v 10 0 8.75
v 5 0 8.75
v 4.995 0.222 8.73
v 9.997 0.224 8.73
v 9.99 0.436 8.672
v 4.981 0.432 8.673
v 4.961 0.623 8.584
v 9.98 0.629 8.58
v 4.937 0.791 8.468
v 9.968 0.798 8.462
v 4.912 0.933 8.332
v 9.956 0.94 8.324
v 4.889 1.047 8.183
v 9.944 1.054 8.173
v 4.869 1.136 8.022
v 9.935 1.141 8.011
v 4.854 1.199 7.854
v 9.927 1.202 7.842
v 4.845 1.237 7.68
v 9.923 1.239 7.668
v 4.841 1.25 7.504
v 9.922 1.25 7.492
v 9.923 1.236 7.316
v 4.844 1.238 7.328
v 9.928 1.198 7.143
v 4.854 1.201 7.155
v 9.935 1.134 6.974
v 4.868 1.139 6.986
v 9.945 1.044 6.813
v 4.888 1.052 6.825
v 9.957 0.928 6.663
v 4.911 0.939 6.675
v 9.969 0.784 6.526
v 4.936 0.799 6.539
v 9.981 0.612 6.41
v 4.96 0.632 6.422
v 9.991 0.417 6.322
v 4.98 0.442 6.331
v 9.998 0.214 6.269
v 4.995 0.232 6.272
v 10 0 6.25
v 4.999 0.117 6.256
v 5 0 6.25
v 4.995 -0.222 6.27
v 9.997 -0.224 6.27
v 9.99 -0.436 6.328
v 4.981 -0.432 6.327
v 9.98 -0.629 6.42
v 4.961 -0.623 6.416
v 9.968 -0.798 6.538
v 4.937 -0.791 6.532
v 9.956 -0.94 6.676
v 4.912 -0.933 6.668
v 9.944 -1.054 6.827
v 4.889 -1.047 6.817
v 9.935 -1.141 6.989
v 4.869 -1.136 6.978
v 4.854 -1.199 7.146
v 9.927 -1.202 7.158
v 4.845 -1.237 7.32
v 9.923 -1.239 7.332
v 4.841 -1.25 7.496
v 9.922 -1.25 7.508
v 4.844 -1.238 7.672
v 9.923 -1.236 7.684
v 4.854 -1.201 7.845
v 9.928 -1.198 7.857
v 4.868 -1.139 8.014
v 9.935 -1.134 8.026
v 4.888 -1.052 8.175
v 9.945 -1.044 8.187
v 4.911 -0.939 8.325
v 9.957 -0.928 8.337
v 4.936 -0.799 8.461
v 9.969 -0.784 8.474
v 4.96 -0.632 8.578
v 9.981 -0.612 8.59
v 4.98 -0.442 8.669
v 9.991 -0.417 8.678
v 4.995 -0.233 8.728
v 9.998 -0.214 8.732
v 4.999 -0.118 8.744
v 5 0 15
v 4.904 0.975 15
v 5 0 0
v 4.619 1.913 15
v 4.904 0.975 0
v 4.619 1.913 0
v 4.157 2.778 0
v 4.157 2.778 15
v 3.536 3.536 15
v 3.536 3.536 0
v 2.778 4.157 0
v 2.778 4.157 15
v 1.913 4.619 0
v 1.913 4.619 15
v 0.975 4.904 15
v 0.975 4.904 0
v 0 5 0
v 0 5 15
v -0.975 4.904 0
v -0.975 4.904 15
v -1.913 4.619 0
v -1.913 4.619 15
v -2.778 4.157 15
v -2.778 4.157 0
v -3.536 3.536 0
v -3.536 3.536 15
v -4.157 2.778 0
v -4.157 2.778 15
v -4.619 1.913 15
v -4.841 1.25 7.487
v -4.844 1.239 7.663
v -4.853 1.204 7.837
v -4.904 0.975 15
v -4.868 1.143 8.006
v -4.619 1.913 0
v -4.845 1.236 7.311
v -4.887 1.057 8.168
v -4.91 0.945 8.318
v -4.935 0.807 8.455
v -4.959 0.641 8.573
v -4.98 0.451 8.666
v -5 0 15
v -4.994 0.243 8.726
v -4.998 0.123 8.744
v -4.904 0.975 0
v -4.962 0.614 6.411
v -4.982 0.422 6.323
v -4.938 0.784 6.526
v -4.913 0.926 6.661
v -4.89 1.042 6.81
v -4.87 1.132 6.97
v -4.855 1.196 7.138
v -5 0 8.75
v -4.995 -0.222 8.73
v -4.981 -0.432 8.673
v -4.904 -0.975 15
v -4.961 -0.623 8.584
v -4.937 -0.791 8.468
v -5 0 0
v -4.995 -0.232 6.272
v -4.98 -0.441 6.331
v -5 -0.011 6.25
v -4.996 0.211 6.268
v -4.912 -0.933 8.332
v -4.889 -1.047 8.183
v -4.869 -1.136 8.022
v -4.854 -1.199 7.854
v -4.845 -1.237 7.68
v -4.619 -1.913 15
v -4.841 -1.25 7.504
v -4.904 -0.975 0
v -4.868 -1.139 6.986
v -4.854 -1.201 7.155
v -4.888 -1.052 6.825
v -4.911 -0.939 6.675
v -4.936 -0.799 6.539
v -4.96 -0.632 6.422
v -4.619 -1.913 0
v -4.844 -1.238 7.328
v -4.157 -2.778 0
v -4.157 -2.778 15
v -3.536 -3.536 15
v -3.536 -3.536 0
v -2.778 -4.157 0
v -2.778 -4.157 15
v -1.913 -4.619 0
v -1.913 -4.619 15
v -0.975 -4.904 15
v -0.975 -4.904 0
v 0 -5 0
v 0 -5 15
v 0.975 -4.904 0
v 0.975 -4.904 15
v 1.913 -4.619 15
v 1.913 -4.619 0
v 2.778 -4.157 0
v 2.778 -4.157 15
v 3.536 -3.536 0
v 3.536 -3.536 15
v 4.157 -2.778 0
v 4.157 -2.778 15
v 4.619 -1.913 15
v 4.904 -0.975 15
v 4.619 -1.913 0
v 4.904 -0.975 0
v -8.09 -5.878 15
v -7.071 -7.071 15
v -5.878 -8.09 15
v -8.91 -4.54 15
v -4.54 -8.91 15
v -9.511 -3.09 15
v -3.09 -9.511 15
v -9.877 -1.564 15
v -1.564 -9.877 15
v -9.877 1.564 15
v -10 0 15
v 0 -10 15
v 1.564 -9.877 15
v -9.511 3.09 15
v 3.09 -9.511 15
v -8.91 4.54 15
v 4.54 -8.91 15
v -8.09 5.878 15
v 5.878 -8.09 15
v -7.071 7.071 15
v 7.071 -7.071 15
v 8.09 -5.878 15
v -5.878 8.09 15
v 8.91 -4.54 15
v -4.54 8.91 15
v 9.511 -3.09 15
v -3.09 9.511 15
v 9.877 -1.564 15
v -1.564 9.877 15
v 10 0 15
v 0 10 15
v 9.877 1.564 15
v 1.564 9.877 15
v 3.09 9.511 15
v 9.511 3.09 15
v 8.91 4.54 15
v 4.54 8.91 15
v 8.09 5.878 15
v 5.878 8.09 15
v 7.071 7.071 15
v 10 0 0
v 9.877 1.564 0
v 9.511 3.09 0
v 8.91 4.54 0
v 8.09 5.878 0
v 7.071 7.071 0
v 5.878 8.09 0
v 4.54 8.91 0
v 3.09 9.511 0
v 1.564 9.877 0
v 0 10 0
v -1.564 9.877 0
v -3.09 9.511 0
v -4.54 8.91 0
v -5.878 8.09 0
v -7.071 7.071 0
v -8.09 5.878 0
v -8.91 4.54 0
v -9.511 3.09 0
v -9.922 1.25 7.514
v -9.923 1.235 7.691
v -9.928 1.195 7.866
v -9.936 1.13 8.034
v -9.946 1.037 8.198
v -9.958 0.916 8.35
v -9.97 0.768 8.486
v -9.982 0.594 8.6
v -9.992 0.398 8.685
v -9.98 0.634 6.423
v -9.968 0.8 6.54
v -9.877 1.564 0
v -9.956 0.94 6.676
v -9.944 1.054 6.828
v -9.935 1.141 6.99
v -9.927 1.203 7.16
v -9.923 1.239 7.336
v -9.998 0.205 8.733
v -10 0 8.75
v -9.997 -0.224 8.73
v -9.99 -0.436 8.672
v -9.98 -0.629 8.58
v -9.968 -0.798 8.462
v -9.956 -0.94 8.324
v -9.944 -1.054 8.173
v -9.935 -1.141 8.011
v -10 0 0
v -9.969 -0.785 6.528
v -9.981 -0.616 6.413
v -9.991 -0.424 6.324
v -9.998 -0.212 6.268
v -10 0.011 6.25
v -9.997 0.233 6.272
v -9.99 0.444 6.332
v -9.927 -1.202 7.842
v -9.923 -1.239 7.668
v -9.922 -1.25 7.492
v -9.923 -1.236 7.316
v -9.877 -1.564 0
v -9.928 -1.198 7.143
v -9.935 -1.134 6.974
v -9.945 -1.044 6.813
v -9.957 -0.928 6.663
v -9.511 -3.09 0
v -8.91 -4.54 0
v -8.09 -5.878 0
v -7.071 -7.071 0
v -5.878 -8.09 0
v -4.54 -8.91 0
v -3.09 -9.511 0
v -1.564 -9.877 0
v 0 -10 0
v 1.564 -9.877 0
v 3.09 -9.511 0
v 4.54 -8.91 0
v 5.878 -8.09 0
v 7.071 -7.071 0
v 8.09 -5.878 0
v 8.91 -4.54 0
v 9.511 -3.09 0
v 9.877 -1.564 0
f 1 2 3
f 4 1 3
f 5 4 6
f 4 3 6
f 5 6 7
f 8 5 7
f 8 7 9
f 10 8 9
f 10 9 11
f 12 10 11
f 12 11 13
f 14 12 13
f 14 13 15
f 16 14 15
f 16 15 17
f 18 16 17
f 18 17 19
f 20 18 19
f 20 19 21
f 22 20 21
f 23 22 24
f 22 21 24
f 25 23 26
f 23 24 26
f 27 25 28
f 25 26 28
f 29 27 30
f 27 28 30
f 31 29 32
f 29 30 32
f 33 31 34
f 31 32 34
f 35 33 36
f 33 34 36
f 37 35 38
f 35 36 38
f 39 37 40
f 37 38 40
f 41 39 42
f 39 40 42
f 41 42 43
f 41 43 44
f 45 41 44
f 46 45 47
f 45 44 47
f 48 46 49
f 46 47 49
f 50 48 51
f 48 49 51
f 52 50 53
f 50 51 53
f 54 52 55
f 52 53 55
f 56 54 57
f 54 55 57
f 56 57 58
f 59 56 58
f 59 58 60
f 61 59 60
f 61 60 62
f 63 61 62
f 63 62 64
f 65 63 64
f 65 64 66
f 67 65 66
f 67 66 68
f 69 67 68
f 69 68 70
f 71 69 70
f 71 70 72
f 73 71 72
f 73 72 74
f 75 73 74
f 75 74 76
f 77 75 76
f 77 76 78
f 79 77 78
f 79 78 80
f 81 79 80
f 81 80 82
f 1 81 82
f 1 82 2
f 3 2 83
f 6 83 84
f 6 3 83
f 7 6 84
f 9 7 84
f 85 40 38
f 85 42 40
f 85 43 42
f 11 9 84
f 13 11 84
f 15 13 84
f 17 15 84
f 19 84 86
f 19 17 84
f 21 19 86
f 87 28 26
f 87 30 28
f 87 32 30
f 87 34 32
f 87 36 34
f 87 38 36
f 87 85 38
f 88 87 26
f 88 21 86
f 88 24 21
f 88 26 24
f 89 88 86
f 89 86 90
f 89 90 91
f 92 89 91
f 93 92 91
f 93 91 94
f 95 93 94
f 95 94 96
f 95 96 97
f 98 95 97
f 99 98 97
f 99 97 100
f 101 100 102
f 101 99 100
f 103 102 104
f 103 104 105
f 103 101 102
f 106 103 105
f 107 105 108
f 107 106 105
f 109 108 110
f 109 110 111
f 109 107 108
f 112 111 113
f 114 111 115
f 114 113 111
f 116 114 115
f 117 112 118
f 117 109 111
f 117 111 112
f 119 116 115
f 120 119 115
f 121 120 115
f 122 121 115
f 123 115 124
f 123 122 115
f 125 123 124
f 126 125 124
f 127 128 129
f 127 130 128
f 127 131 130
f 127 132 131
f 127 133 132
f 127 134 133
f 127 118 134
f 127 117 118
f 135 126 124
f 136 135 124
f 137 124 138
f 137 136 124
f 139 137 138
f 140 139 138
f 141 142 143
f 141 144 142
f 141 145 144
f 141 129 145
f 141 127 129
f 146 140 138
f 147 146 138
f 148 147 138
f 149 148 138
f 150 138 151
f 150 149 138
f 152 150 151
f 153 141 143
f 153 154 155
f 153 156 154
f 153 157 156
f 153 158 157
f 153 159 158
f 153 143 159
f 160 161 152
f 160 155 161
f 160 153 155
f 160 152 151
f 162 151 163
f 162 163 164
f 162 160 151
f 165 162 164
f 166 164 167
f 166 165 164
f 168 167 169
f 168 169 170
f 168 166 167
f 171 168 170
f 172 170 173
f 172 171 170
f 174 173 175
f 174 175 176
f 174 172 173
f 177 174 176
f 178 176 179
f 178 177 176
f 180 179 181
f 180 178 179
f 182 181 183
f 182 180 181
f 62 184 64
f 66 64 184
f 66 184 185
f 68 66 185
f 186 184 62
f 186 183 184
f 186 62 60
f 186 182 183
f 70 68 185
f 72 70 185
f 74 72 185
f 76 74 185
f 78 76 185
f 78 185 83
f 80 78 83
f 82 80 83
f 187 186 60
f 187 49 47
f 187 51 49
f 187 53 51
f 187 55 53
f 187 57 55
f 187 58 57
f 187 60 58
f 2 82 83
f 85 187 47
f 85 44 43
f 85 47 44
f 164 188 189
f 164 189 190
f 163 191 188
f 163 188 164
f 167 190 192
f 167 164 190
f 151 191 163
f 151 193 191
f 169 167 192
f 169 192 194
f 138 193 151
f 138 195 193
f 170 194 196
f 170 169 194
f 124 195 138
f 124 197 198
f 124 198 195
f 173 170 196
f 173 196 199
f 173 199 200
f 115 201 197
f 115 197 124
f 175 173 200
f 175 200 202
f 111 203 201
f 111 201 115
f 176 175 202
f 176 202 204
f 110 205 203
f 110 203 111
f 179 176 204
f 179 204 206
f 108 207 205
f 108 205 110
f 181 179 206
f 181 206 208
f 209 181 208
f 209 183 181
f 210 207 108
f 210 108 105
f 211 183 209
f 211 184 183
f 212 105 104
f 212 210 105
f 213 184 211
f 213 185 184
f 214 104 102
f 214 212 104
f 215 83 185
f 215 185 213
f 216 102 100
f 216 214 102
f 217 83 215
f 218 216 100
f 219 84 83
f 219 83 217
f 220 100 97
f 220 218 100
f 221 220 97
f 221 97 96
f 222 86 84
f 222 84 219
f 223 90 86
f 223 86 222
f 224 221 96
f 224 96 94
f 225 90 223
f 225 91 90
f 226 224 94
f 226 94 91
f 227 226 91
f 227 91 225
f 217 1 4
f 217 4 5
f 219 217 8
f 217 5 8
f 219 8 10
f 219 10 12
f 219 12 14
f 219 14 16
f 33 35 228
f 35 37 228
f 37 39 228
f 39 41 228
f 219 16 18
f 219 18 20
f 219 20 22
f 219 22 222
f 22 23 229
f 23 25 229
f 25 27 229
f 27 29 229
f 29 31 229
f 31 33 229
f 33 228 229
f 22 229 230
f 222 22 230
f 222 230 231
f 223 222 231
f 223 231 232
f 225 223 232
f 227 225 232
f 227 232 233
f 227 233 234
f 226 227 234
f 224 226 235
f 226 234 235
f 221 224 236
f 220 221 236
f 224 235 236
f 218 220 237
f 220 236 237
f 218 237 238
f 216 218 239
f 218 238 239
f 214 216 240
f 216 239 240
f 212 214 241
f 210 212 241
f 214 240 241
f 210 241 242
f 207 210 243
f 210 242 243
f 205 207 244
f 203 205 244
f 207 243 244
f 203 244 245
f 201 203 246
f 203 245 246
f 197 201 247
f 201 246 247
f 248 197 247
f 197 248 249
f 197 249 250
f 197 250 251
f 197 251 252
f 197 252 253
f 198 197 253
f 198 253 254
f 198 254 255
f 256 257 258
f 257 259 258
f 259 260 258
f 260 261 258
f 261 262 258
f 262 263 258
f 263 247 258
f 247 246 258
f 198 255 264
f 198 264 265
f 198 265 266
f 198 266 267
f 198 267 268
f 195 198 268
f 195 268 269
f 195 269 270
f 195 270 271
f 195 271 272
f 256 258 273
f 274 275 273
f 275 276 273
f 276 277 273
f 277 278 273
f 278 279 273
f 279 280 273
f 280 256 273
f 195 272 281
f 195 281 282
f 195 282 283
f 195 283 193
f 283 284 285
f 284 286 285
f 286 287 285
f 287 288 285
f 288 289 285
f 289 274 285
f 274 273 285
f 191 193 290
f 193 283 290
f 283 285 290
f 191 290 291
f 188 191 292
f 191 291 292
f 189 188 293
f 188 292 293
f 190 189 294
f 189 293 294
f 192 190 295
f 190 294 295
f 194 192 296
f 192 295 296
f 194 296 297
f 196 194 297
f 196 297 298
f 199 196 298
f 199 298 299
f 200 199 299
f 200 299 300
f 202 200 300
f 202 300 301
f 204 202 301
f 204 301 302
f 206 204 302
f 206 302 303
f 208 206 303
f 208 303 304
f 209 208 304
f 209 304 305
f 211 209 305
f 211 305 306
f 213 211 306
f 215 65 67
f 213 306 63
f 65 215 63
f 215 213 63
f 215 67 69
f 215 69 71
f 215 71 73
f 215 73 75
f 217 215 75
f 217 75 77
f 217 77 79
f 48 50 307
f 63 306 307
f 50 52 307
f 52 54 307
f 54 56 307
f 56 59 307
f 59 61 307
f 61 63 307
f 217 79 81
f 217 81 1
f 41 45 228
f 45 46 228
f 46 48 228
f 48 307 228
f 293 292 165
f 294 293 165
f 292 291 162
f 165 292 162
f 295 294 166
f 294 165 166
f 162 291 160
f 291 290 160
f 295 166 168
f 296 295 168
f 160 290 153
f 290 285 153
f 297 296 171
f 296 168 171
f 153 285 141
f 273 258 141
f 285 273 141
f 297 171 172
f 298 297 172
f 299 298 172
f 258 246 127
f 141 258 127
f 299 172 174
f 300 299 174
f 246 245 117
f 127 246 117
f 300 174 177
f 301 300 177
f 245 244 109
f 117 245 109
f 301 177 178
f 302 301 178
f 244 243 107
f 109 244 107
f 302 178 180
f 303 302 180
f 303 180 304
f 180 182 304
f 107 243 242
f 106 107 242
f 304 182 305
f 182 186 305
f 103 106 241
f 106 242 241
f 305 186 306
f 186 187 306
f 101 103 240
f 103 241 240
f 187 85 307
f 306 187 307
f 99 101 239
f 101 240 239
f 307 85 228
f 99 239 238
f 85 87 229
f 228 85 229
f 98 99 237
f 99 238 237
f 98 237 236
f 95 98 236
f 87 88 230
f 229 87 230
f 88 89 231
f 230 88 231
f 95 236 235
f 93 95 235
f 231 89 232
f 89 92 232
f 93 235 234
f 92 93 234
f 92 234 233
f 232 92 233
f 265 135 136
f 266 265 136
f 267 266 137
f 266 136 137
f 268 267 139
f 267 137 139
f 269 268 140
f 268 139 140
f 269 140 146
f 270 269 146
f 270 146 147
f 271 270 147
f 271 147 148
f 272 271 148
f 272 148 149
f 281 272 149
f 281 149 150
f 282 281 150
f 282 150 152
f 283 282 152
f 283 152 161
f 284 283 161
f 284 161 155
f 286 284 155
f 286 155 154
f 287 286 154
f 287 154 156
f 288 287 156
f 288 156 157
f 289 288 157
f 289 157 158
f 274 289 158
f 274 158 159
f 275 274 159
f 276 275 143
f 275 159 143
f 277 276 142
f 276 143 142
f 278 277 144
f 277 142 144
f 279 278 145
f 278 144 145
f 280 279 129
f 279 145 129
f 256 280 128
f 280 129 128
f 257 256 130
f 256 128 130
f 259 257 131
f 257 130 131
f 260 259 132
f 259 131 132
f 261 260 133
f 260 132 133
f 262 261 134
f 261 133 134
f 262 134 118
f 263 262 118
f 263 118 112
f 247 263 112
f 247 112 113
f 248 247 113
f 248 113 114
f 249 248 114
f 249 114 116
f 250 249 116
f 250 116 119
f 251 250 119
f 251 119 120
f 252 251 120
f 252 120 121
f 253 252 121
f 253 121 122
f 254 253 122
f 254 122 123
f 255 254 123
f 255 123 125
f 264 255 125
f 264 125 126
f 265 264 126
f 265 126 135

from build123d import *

# Parameters (mm, degrees)
ESQUISSE1_R           = 10
ESQUISSE1_R_2         = 5
BOSS_EXTRU_1_DEPTH    = 15
TROU_TARAUD_M31_D     = 2.5
TROU_TARAUD_M31_DEPTH = 8.5
TROU_TARAUD_M31_TIP   = 0.751075774
TROU_TARAUD_M32_D     = 2.5
TROU_TARAUD_M32_DEPTH = 8.5
TROU_TARAUD_M32_TIP   = 0.751075774


with BuildPart() as part:
    # Esquisse1 → Boss.-Extru.1 (new body)
    with BuildSketch(Plane.XY):
        Circle(ESQUISSE1_R)
        Circle(ESQUISSE1_R_2, mode=Mode.SUBTRACT)
    extrude(amount=BOSS_EXTRU_1_DEPTH)

    # Trou taraudé M31
    with Locations(Plane(origin=(10, 0, 0), x_dir=(0, 0, -1), z_dir=(1, 0, 0))):
        with Locations((-7.5, 0)):
            Hole(TROU_TARAUD_M31_D / 2, depth=TROU_TARAUD_M31_DEPTH)
            with Locations((0, 0, -(TROU_TARAUD_M31_DEPTH + TROU_TARAUD_M31_TIP / 2))):  # 118° drill point
                Cone(0, TROU_TARAUD_M31_D / 2, TROU_TARAUD_M31_TIP, mode=Mode.SUBTRACT)

    # Trou taraudé M32
    with Locations(Plane(origin=(-10, 0, 0), x_dir=(0, 0, -1), z_dir=(-1, 0, 0))):
        with Locations((-7.5, 0)):
            Hole(TROU_TARAUD_M32_D / 2, depth=TROU_TARAUD_M32_DEPTH)
            with Locations((0, 0, -(TROU_TARAUD_M32_DEPTH + TROU_TARAUD_M32_TIP / 2))):  # 118° drill point
                Cone(0, TROU_TARAUD_M32_D / 2, TROU_TARAUD_M32_TIP, mode=Mode.SUBTRACT)


solid = part.part
